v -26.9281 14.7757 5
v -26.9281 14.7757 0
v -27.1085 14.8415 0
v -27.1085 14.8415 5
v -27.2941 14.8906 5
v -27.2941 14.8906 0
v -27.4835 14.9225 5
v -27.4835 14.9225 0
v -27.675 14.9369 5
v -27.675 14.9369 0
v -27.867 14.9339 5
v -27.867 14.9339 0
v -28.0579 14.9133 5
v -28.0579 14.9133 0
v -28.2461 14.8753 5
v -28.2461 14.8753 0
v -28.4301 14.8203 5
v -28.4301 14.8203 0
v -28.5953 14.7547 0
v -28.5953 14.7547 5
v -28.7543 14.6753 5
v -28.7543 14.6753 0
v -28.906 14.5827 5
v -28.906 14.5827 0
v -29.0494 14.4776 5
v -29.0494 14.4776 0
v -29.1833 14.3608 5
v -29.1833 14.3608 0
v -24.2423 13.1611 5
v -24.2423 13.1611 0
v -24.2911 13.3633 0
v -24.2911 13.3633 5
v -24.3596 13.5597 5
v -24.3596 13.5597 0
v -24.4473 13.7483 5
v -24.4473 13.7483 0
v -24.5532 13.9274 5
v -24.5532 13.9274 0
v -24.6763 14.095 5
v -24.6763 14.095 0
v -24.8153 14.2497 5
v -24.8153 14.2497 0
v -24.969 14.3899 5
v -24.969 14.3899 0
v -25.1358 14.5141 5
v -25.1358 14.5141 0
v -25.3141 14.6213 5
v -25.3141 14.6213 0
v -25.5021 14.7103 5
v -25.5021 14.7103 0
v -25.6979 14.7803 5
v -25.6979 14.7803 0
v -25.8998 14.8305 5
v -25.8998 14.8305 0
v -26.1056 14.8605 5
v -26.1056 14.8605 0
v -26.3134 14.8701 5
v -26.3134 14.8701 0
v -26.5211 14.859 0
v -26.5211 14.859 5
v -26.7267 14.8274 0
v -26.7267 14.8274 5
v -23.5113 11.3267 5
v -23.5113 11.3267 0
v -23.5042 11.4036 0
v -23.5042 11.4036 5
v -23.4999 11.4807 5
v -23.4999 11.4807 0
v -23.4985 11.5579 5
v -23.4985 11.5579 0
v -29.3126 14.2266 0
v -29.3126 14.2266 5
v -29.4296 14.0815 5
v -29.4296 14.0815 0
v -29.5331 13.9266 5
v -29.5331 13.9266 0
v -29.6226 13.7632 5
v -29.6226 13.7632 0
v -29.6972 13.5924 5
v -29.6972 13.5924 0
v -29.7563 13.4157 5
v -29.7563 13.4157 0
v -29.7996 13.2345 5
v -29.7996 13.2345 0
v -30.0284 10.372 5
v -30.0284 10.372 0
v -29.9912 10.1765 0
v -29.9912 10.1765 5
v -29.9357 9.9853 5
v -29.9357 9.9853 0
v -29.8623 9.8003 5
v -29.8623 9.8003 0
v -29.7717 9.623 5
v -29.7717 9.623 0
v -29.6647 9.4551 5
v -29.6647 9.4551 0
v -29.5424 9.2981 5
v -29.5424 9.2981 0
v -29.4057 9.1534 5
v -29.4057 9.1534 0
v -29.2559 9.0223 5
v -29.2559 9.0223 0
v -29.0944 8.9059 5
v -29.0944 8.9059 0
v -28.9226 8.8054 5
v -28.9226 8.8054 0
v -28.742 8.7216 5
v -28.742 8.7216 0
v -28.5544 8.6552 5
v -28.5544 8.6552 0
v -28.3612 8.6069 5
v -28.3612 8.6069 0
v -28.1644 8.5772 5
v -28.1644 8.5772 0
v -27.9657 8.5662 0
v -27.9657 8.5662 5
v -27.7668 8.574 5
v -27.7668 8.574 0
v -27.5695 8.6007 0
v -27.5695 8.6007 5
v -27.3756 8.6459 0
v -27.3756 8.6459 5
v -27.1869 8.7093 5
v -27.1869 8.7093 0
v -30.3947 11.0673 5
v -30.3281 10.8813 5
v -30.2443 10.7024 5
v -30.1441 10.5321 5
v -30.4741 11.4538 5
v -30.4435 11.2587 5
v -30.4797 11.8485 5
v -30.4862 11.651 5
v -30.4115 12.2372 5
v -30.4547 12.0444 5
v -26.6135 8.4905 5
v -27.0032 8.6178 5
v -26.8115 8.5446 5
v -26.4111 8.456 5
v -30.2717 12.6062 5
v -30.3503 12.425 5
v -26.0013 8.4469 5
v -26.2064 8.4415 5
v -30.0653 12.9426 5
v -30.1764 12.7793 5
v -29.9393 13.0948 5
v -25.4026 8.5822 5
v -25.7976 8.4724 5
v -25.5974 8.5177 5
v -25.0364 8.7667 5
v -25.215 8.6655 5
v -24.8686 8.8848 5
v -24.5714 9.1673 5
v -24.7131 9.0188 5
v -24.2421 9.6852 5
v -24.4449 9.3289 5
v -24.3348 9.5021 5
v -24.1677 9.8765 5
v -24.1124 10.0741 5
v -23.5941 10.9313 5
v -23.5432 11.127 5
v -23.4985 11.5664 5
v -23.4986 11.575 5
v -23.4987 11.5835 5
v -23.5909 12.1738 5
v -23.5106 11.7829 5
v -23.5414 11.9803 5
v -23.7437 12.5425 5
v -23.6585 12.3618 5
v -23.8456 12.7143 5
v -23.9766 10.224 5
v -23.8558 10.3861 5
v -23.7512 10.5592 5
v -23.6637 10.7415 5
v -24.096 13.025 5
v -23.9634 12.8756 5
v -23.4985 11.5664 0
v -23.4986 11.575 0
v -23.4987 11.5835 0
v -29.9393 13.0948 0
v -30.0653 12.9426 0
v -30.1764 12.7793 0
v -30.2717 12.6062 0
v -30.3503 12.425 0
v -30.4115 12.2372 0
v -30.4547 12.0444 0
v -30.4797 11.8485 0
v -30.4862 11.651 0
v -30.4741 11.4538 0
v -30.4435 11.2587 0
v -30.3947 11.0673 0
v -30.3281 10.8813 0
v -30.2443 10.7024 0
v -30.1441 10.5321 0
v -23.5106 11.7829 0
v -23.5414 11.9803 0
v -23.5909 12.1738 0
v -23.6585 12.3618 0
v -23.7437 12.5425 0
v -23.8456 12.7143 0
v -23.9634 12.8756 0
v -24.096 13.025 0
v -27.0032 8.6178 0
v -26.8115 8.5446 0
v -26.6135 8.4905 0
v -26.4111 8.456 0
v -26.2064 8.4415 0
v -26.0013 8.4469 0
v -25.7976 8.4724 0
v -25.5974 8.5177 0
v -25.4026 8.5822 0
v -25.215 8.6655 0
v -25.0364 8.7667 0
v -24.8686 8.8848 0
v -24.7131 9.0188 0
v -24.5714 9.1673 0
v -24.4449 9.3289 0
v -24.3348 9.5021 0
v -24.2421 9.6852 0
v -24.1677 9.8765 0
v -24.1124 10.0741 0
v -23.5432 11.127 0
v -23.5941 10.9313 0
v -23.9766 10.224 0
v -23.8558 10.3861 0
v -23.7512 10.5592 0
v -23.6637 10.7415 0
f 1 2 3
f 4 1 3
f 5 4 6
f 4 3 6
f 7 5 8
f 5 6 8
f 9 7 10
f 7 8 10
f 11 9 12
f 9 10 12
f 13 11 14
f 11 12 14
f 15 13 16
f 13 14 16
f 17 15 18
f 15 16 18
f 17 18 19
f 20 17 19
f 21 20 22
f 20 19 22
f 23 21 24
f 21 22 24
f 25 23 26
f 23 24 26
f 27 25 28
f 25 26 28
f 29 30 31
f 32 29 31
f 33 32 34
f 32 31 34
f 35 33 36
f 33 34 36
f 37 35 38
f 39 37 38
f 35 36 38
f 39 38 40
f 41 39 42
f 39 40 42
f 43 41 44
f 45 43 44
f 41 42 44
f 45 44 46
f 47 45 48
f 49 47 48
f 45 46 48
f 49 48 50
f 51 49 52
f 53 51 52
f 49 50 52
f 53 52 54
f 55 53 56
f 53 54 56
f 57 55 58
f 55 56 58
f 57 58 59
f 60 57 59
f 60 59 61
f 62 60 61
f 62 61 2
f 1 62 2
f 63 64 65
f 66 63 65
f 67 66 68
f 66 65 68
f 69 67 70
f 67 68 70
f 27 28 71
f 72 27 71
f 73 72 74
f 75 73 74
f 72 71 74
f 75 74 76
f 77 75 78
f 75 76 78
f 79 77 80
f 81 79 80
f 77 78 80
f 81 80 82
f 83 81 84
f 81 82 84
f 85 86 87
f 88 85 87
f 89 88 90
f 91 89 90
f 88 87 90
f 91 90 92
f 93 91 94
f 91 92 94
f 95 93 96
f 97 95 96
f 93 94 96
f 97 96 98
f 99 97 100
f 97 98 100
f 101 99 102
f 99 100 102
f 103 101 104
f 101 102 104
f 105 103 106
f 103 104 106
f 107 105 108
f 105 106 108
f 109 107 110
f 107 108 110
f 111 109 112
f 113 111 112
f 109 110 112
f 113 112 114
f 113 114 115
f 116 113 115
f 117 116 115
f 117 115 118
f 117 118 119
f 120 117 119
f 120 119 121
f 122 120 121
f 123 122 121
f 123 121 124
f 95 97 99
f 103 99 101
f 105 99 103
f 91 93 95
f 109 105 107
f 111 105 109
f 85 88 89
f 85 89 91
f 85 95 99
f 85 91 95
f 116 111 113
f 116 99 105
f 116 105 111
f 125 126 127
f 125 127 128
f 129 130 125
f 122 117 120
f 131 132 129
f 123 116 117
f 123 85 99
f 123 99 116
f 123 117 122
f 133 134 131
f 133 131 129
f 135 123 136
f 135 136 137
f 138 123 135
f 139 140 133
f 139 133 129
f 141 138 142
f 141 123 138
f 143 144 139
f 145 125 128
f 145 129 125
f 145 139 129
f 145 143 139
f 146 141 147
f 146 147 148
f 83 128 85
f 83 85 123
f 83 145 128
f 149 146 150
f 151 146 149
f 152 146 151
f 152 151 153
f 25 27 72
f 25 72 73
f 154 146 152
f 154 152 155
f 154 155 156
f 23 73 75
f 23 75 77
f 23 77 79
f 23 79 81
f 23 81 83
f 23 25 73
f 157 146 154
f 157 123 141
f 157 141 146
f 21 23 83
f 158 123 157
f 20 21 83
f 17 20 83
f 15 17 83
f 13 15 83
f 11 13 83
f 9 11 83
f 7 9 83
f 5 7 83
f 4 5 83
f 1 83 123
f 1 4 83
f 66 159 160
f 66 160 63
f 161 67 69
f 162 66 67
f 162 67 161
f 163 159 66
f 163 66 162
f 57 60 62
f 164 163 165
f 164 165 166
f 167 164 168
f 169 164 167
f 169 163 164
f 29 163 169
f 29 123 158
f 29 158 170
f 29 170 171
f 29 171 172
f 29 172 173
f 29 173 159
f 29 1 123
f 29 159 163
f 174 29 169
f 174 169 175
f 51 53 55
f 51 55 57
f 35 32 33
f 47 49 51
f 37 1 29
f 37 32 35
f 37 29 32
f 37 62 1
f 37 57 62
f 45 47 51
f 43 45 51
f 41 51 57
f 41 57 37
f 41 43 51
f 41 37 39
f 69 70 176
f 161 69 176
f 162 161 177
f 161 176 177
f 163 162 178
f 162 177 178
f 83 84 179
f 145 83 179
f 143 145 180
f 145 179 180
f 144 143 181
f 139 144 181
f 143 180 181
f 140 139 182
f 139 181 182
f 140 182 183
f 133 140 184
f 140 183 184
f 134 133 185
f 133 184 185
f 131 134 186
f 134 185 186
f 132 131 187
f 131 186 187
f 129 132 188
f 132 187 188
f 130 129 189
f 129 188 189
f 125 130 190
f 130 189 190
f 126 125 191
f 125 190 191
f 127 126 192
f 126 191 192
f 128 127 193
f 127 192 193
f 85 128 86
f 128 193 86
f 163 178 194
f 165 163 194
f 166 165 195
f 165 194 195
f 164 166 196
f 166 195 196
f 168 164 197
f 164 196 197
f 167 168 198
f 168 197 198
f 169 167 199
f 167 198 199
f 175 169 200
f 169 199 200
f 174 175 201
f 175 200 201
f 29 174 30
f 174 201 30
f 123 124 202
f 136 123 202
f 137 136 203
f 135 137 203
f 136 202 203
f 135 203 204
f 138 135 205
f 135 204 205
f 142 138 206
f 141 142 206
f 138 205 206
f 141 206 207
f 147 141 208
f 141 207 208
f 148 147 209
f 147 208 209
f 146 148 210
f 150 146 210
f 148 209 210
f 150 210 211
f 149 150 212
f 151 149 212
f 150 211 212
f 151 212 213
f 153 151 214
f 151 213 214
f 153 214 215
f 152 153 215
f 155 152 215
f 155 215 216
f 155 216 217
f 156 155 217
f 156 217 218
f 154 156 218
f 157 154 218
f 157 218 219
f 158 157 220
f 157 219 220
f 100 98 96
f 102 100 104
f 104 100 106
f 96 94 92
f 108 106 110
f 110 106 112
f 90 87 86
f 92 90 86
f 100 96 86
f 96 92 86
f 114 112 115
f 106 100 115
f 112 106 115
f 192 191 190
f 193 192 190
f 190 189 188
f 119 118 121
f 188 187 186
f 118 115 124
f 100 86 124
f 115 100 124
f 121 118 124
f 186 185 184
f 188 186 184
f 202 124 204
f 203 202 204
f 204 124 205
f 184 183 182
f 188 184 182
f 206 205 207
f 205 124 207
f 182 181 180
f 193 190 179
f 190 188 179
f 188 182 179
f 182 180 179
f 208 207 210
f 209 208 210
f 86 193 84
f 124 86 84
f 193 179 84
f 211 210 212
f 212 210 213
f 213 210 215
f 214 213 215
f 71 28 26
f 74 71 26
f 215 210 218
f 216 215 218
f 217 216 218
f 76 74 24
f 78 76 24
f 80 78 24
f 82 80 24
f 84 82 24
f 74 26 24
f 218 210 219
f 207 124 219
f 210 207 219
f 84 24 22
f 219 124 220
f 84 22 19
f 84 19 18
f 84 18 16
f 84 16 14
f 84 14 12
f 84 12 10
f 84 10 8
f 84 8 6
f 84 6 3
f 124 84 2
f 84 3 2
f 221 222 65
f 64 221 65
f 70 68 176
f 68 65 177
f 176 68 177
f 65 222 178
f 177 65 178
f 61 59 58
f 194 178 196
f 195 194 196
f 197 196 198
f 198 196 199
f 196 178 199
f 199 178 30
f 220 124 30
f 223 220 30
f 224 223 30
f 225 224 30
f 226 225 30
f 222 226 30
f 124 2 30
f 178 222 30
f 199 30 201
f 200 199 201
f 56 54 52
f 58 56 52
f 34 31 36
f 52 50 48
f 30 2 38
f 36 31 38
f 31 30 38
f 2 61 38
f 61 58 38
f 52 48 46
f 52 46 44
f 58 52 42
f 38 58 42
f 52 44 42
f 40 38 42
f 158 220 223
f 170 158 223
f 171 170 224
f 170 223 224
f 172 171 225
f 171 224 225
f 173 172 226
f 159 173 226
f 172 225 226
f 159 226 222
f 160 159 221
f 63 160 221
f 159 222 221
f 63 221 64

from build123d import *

# Parameters (mm, degrees)
F1_DEPTH = 5


with BuildPart() as f1:
    # F0 (on Top) → F1 (new body)
    with BuildSketch(Plane.XY):
        with BuildLine():
            ThreePointArc((-24.2055166316, 12.7700755201), (-24.2696493036, 12.2550568575), (-24.4581301771, 11.7714948835))
            ThreePointArc((-24.4581301771, 11.7714948835), (-24.1618816348, 11.1876524422), (-24.059825636, 10.5409533096))
            ThreePointArc((-24.059825636, 10.5409533096), (-24.0730018758, 10.3060776102), (-24.1123652494, 10.074149319))
            ThreePointArc((-24.1123652494, 10.074149319), (-23.7052429878, 10.6492604264), (-23.5112748984, 11.3266655504))
            ThreePointArc((-23.5112748984, 11.3266655504), (-23.5026114925, 11.4549716649), (-23.4986674085, 11.5835094331))
            ThreePointArc((-23.4986674085, 11.5835094331), (-23.6989325998, 12.4531743511), (-24.2422517743, 13.1611485676))
            ThreePointArc((-24.2422517743, 13.1611485676), (-24.214720587, 12.966472821), (-24.2055166316, 12.7700755201))
        make_face()
        with BuildLine():
            ThreePointArc((-28.4301242768, 14.8203377131), (-28.8311396591, 14.6305750844), (-29.183341045, 14.3608022616))
            ThreePointArc((-29.183341045, 14.3608022616), (-28.8212714421, 14.6144002572), (-28.4301242768, 14.8203377131))
        make_face()
        with BuildLine():
            ThreePointArc((-29.7996238256, 13.2344963051), (-29.0339295569, 13.6788545189), (-28.1531562944, 13.7681875762))
            ThreePointArc((-28.1531562944, 13.7681875762), (-27.6394070264, 14.3920300246), (-26.9281095858, 14.7756622206))
            ThreePointArc((-26.9281095858, 14.7756622206), (-27.6749841403, 14.9369466793), (-28.4301242768, 14.8203377131))
            ThreePointArc((-28.4301242768, 14.8203377131), (-28.8212714421, 14.6144002572), (-29.183341045, 14.3608022616))
            ThreePointArc((-29.183341045, 14.3608022616), (-29.5796675426, 13.8459016813), (-29.7996238256, 13.2344963051))
        make_face()
        with BuildLine():
            ThreePointArc((-23.4985106561, 11.5578513882), (-23.4985498446, 11.5706806501), (-23.4986674085, 11.5835094331))
            ThreePointArc((-23.4986674085, 11.5835094331), (-23.5026114925, 11.4549716649), (-23.5112748984, 11.3266655504))
            ThreePointArc((-23.5112748984, 11.3266655504), (-23.5017041449, 11.4420824184), (-23.4985106561, 11.5578513882))
        make_face()
        with BuildLine():
            ThreePointArc((-28.40482143, 12.7160443864), (-28.3479034627, 13.2585998615), (-28.1531562944, 13.7681875762))
            ThreePointArc((-28.1531562944, 13.7681875762), (-29.0339295569, 13.6788545189), (-29.7996238256, 13.2344963051))
            ThreePointArc((-29.7996238256, 13.2344963051), (-29.8198130362, 12.5665223302), (-29.6291199592, 11.926028001))
            ThreePointArc((-29.6291199592, 11.926028001), (-29.0876846229, 12.4306224757), (-28.40482143, 12.7160443864))
        make_face()
        with BuildLine():
            ThreePointArc((-28.1531562944, 13.7681875762), (-27.4897982959, 13.5801566584), (-26.9230939423, 13.1874154766))
            ThreePointArc((-26.9230939423, 13.1874154766), (-26.3955835278, 13.500703631), (-25.8000387495, 13.6481591234))
            ThreePointArc((-25.8000387495, 13.6481591234), (-26.2528678936, 14.3231729424), (-26.9281095858, 14.7756622206))
            ThreePointArc((-26.9281095858, 14.7756622206), (-27.6394070264, 14.3920300246), (-28.1531562944, 13.7681875762))
        make_face()
        with BuildLine():
            ThreePointArc((-26.9281095858, 14.7756622206), (-26.2528678936, 14.3231729424), (-25.8000387495, 13.6481591234))
            ThreePointArc((-25.8000387495, 13.6481591234), (-24.9718962461, 13.5621852878), (-24.2422517743, 13.1611485676))
            ThreePointArc((-24.2422517743, 13.1611485676), (-25.2235982118, 14.5699234394), (-26.9281095858, 14.7756622206))
        make_face()
        with BuildLine():
            ThreePointArc((-24.1123652494, 10.074149319), (-25.0717419882, 9.5249926203), (-26.1770822404, 9.5391253241))
            ThreePointArc((-26.1770822404, 9.5391253241), (-26.6157999478, 9.0436305274), (-27.1869340682, 8.7092742251))
            ThreePointArc((-27.1869340682, 8.7092742251), (-25.307768987, 8.6215785502), (-24.1123652494, 10.074149319))
        make_face()
        with BuildLine():
            ThreePointArc((-27.1869340682, 8.7092742251), (-27.6825346621, 9.0948007513), (-28.0420062254, 9.609612218))
            ThreePointArc((-28.0420062254, 9.609612218), (-29.1388930427, 9.7206321061), (-30.0283765953, 10.3720191763))
            ThreePointArc((-30.0283765953, 10.3720191763), (-29.0096897375, 8.8536155015), (-27.1869340682, 8.7092742251))
        make_face()
        with BuildLine():
            ThreePointArc((-29.6291199592, 11.926028001), (-29.8198130362, 12.5665223302), (-29.7996238256, 13.2344963051))
            ThreePointArc((-29.7996238256, 13.2344963051), (-30.4797234146, 11.8484670975), (-30.0283765953, 10.3720191763))
            ThreePointArc((-30.0283765953, 10.3720191763), (-29.9830134729, 11.188657471), (-29.6291199592, 11.926028001))
        make_face()
        with BuildLine():
            ThreePointArc((-26.1770822404, 9.5391253241), (-26.6511145003, 9.7407038578), (-27.0618137855, 10.0516163629))
            ThreePointArc((-27.0618137855, 10.0516163629), (-27.5231412696, 9.7668164785), (-28.0420062254, 9.609612218))
            ThreePointArc((-28.0420062254, 9.609612218), (-27.6825346621, 9.0948007513), (-27.1869340682, 8.7092742251))
            ThreePointArc((-27.1869340682, 8.7092742251), (-26.6157999478, 9.0436305274), (-26.1770822404, 9.5391253241))
        make_face()
        with BuildLine():
            ThreePointArc((-24.4581301771, 11.7714948835), (-25.0396352661, 11.0945026722), (-25.8497644493, 10.7201267528))
            ThreePointArc((-25.8497644493, 10.7201267528), (-25.8492430553, 10.6931134221), (-25.8490692477, 10.6660956191))
            ThreePointArc((-25.8490692477, 10.6660956191), (-25.9327393249, 10.079227966), (-26.1770822404, 9.5391253241))
            ThreePointArc((-26.1770822404, 9.5391253241), (-25.0717419882, 9.5249926203), (-24.1123652494, 10.074149319))
            ThreePointArc((-24.1123652494, 10.074149319), (-24.0730018758, 10.3060776102), (-24.059825636, 10.5409533096))
            ThreePointArc((-24.059825636, 10.5409533096), (-24.1618816348, 11.1876524422), (-24.4581301771, 11.7714948835))
        make_face()
        with BuildLine():
            ThreePointArc((-25.6374183243, 12.8378749862), (-25.6414269658, 12.7081821767), (-25.6534375861, 12.5789845024))
            ThreePointArc((-25.6534375861, 12.5789845024), (-24.9842755237, 12.2810917907), (-24.4581301771, 11.7714948835))
            ThreePointArc((-24.4581301771, 11.7714948835), (-24.2696493036, 12.2550568575), (-24.2055166316, 12.7700755201))
            ThreePointArc((-24.2055166316, 12.7700755201), (-24.214720587, 12.966472821), (-24.2422517743, 13.1611485676))
            ThreePointArc((-24.2422517743, 13.1611485676), (-24.9718962461, 13.5621852878), (-25.8000387495, 13.6481591234))
            ThreePointArc((-25.8000387495, 13.6481591234), (-25.6784747715, 13.2510958066), (-25.6374183243, 12.8378749862))
        make_face()
        with BuildLine():
            ThreePointArc((-25.6534375861, 12.5789845024), (-25.7899829829, 12.0520661094), (-26.0573676128, 11.5779426044))
            ThreePointArc((-26.0573676128, 11.5779426044), (-25.9079923025, 11.160064144), (-25.8497644493, 10.7201267528))
            ThreePointArc((-25.8497644493, 10.7201267528), (-25.0396352661, 11.0945026722), (-24.4581301771, 11.7714948835))
            ThreePointArc((-24.4581301771, 11.7714948835), (-24.9842755237, 12.2810917907), (-25.6534375861, 12.5789845024))
        make_face()
        with BuildLine():
            ThreePointArc((-30.0283765953, 10.3720191763), (-29.1388930427, 9.7206321061), (-28.0420062254, 9.609612218))
            ThreePointArc((-28.0420062254, 9.609612218), (-28.2302776929, 10.1899144513), (-28.2438063742, 10.7998437934))
            ThreePointArc((-28.2438063742, 10.7998437934), (-29.0620998904, 11.2083907891), (-29.6291199592, 11.926028001))
            ThreePointArc((-29.6291199592, 11.926028001), (-29.9830134729, 11.188657471), (-30.0283765953, 10.3720191763))
        make_face()
        with BuildLine():
            ThreePointArc((-28.0072120905, 11.5395339461), (-28.2949750863, 12.0977251226), (-28.40482143, 12.7160443864))
            ThreePointArc((-28.40482143, 12.7160443864), (-29.0876846229, 12.4306224757), (-29.6291199592, 11.926028001))
            ThreePointArc((-29.6291199592, 11.926028001), (-29.0620998904, 11.2083907891), (-28.2438063742, 10.7998437934))
            ThreePointArc((-28.2438063742, 10.7998437934), (-28.1599999738, 11.180720938), (-28.0072120905, 11.5395339461))
        make_face()
        with BuildLine():
            ThreePointArc((-27.6459710427, 12.0246553788), (-27.5365507708, 12.3665543708), (-27.3704976635, 12.6848216832))
            ThreePointArc((-27.3704976635, 12.6848216832), (-27.88570628, 12.7651394811), (-28.40482143, 12.7160443864))
            ThreePointArc((-28.40482143, 12.7160443864), (-28.2949750863, 12.0977251226), (-28.0072120905, 11.5395339461))
            ThreePointArc((-28.0072120905, 11.5395339461), (-27.8441487548, 11.7951684552), (-27.6459710427, 12.0246553788))
        make_face()
        with BuildLine():
            ThreePointArc((-26.9230939423, 13.1874154766), (-26.6891371956, 12.917832752), (-26.5042164823, 12.6125215428))
            ThreePointArc((-26.5042164823, 12.6125215428), (-26.0771095144, 12.6393236399), (-25.6534375861, 12.5789845024))
            ThreePointArc((-25.6534375861, 12.5789845024), (-25.6414269658, 12.7081821767), (-25.6374183243, 12.8378749862))
            ThreePointArc((-25.6374183243, 12.8378749862), (-25.6784747715, 13.2510958066), (-25.8000387495, 13.6481591234))
            ThreePointArc((-25.8000387495, 13.6481591234), (-26.3955835278, 13.500703631), (-26.9230939423, 13.1874154766))
        make_face()
        with BuildLine():
            ThreePointArc((-28.0420062254, 9.609612218), (-27.5231412696, 9.7668164785), (-27.0618137855, 10.0516163629))
            ThreePointArc((-27.0618137855, 10.0516163629), (-27.3340934469, 10.3755856074), (-27.535890231, 10.7475672511))
            ThreePointArc((-27.535890231, 10.7475672511), (-27.8920731254, 10.7435775163), (-28.2438063742, 10.7998437934))
            ThreePointArc((-28.2438063742, 10.7998437934), (-28.2302776929, 10.1899144513), (-28.0420062254, 9.609612218))
        make_face()
        with BuildLine():
            ThreePointArc((-27.3704976635, 12.6848216832), (-27.1670568065, 12.9541547127), (-26.9230939423, 13.1874154766))
            ThreePointArc((-26.9230939423, 13.1874154766), (-27.4897982959, 13.5801566584), (-28.1531562944, 13.7681875762))
            ThreePointArc((-28.1531562944, 13.7681875762), (-28.3479034627, 13.2585998615), (-28.40482143, 12.7160443864))
            ThreePointArc((-28.40482143, 12.7160443864), (-27.88570628, 12.7651394811), (-27.3704976635, 12.6848216832))
        make_face()
        with BuildLine():
            ThreePointArc((-25.8497644493, 10.7201267528), (-26.1927285037, 10.6731065555), (-26.5387574089, 10.6830683951))
            ThreePointArc((-26.5387574089, 10.6830683951), (-26.7691671787, 10.3415657778), (-27.0618137855, 10.0516163629))
            ThreePointArc((-27.0618137855, 10.0516163629), (-26.6511145003, 9.7407038578), (-26.1770822404, 9.5391253241))
            ThreePointArc((-26.1770822404, 9.5391253241), (-25.9327393249, 10.079227966), (-25.8490692477, 10.6660956191))
            ThreePointArc((-25.8490692477, 10.6660956191), (-25.8492430553, 10.6931134221), (-25.8497644493, 10.7201267528))
        make_face()
        with BuildLine():
            ThreePointArc((-26.0573676128, 11.5779426044), (-26.1838386402, 11.4249382697), (-26.3241915704, 11.2845591323))
            ThreePointArc((-26.3241915704, 11.2845591323), (-26.4084764266, 10.9756098157), (-26.5387574089, 10.6830683951))
            ThreePointArc((-26.5387574089, 10.6830683951), (-26.1927285037, 10.6731065555), (-25.8497644493, 10.7201267528))
            ThreePointArc((-25.8497644493, 10.7201267528), (-25.9079923025, 11.160064144), (-26.0573676128, 11.5779426044))
        make_face()
        with BuildLine():
            ThreePointArc((-27.0618137855, 10.0516163629), (-26.7691671787, 10.3415657778), (-26.5387574089, 10.6830683951))
            ThreePointArc((-26.5387574089, 10.6830683951), (-26.8321037727, 10.7371697222), (-27.1148253702, 10.8322882857))
            ThreePointArc((-27.1148253702, 10.8322882857), (-27.3231861568, 10.7791346647), (-27.535890231, 10.7475672511))
            ThreePointArc((-27.535890231, 10.7475672511), (-27.3340934469, 10.3755856074), (-27.0618137855, 10.0516163629))
        make_face()
        with BuildLine():
            ThreePointArc((-27.535890231, 10.7475672511), (-27.609784743, 10.9538840486), (-27.6617755135, 11.1667783407))
            ThreePointArc((-27.6617755135, 11.1667783407), (-27.8458113673, 11.3426680354), (-28.0072120905, 11.5395339461))
            ThreePointArc((-28.0072120905, 11.5395339461), (-28.1599999738, 11.180720938), (-28.2438063742, 10.7998437934))
            ThreePointArc((-28.2438063742, 10.7998437934), (-27.8920731254, 10.7435775163), (-27.535890231, 10.7475672511))
        make_face()
        with BuildLine():
            ThreePointArc((-27.535890231, 10.7475672511), (-27.3231861568, 10.7791346647), (-27.1148253702, 10.8322882857))
            ThreePointArc((-27.1148253702, 10.8322882857), (-27.4011405082, 10.9785375436), (-27.6617755135, 11.1667783407))
            ThreePointArc((-27.6617755135, 11.1667783407), (-27.609784743, 10.9538840486), (-27.535890231, 10.7475672511))
        make_face()
        with BuildLine():
            ThreePointArc((-26.5387574089, 10.6830683951), (-26.4084764266, 10.9756098157), (-26.3241915704, 11.2845591323))
            ThreePointArc((-26.3241915704, 11.2845591323), (-26.6946922334, 11.0150413955), (-27.1148253702, 10.8322882857))
            ThreePointArc((-27.1148253702, 10.8322882857), (-26.8321037727, 10.7371697222), (-26.5387574089, 10.6830683951))
        make_face()
        with BuildLine():
            ThreePointArc((-26.3070897241, 11.9752568941), (-26.2915766223, 11.8285822322), (-26.2863970717, 11.6811804512))
            ThreePointArc((-26.2863970717, 11.6811804512), (-26.2958670489, 11.4819714562), (-26.3241915704, 11.2845591323))
            ThreePointArc((-26.3241915704, 11.2845591323), (-26.1838386402, 11.4249382697), (-26.0573676128, 11.5779426044))
            ThreePointArc((-26.0573676128, 11.5779426044), (-26.1710955995, 11.7835971655), (-26.3070897241, 11.9752568941))
        make_face()
        with BuildLine():
            ThreePointArc((-26.5042164823, 12.6125215428), (-26.3801884019, 12.3017662818), (-26.3070897241, 11.9752568941))
            ThreePointArc((-26.3070897241, 11.9752568941), (-26.1710955995, 11.7835971655), (-26.0573676128, 11.5779426044))
            ThreePointArc((-26.0573676128, 11.5779426044), (-25.7899829829, 12.0520661094), (-25.6534375861, 12.5789845024))
            ThreePointArc((-25.6534375861, 12.5789845024), (-26.0771095144, 12.6393236399), (-26.5042164823, 12.6125215428))
        make_face()
        with BuildLine():
            ThreePointArc((-26.9219608155, 12.4977747036), (-26.58919284, 12.2663256512), (-26.3070897241, 11.9752568941))
            ThreePointArc((-26.3070897241, 11.9752568941), (-26.3801884019, 12.3017662818), (-26.5042164823, 12.6125215428))
            ThreePointArc((-26.5042164823, 12.6125215428), (-26.7160555082, 12.5659491933), (-26.9219608155, 12.4977747036))
        make_face()
        with BuildLine():
            ThreePointArc((-26.9219608155, 12.4977747036), (-26.7160555082, 12.5659491933), (-26.5042164823, 12.6125215428))
            ThreePointArc((-26.5042164823, 12.6125215428), (-26.6891371956, 12.917832752), (-26.9230939423, 13.1874154766))
            ThreePointArc((-26.9230939423, 13.1874154766), (-27.1670568065, 12.9541547127), (-27.3704976635, 12.6848216832))
            ThreePointArc((-27.3704976635, 12.6848216832), (-27.1408002814, 12.6043167825), (-26.9219608155, 12.4977747036))
        make_face()
        with BuildLine():
            ThreePointArc((-27.6459710427, 12.0246553788), (-27.3085866522, 12.2988919113), (-26.9219608155, 12.4977747036))
            ThreePointArc((-26.9219608155, 12.4977747036), (-27.1408002814, 12.6043167825), (-27.3704976635, 12.6848216832))
            ThreePointArc((-27.3704976635, 12.6848216832), (-27.5365507708, 12.3665543708), (-27.6459710427, 12.0246553788))
        make_face()
        with BuildLine():
            ThreePointArc((-27.6617755135, 11.1667783407), (-27.6981543785, 11.5965326402), (-27.6459710427, 12.0246553788))
            ThreePointArc((-27.6459710427, 12.0246553788), (-27.8441487548, 11.7951684552), (-28.0072120905, 11.5395339461))
            ThreePointArc((-28.0072120905, 11.5395339461), (-27.8458113673, 11.3426680354), (-27.6617755135, 11.1667783407))
        make_face()
        with BuildLine():
            ThreePointArc((-26.3241915704, 11.2845591323), (-26.2958670489, 11.4819714562), (-26.2863970717, 11.6811804512))
            ThreePointArc((-26.2863970717, 11.6811804512), (-26.2915766223, 11.8285822322), (-26.3070897241, 11.9752568941))
            ThreePointArc((-26.3070897241, 11.9752568941), (-26.58919284, 12.2663256512), (-26.9219608155, 12.4977747036))
            ThreePointArc((-26.9219608155, 12.4977747036), (-27.3085866522, 12.2988919113), (-27.6459710427, 12.0246553788))
            ThreePointArc((-27.6459710427, 12.0246553788), (-27.6981543785, 11.5965326402), (-27.6617755135, 11.1667783407))
            ThreePointArc((-27.6617755135, 11.1667783407), (-27.4011405082, 10.9785375436), (-27.1148253702, 10.8322882857))
            ThreePointArc((-27.1148253702, 10.8322882857), (-26.6946922334, 11.0150413955), (-26.3241915704, 11.2845591323))
        make_face()
    extrude(amount=F1_DEPTH)


solid = f1.part
